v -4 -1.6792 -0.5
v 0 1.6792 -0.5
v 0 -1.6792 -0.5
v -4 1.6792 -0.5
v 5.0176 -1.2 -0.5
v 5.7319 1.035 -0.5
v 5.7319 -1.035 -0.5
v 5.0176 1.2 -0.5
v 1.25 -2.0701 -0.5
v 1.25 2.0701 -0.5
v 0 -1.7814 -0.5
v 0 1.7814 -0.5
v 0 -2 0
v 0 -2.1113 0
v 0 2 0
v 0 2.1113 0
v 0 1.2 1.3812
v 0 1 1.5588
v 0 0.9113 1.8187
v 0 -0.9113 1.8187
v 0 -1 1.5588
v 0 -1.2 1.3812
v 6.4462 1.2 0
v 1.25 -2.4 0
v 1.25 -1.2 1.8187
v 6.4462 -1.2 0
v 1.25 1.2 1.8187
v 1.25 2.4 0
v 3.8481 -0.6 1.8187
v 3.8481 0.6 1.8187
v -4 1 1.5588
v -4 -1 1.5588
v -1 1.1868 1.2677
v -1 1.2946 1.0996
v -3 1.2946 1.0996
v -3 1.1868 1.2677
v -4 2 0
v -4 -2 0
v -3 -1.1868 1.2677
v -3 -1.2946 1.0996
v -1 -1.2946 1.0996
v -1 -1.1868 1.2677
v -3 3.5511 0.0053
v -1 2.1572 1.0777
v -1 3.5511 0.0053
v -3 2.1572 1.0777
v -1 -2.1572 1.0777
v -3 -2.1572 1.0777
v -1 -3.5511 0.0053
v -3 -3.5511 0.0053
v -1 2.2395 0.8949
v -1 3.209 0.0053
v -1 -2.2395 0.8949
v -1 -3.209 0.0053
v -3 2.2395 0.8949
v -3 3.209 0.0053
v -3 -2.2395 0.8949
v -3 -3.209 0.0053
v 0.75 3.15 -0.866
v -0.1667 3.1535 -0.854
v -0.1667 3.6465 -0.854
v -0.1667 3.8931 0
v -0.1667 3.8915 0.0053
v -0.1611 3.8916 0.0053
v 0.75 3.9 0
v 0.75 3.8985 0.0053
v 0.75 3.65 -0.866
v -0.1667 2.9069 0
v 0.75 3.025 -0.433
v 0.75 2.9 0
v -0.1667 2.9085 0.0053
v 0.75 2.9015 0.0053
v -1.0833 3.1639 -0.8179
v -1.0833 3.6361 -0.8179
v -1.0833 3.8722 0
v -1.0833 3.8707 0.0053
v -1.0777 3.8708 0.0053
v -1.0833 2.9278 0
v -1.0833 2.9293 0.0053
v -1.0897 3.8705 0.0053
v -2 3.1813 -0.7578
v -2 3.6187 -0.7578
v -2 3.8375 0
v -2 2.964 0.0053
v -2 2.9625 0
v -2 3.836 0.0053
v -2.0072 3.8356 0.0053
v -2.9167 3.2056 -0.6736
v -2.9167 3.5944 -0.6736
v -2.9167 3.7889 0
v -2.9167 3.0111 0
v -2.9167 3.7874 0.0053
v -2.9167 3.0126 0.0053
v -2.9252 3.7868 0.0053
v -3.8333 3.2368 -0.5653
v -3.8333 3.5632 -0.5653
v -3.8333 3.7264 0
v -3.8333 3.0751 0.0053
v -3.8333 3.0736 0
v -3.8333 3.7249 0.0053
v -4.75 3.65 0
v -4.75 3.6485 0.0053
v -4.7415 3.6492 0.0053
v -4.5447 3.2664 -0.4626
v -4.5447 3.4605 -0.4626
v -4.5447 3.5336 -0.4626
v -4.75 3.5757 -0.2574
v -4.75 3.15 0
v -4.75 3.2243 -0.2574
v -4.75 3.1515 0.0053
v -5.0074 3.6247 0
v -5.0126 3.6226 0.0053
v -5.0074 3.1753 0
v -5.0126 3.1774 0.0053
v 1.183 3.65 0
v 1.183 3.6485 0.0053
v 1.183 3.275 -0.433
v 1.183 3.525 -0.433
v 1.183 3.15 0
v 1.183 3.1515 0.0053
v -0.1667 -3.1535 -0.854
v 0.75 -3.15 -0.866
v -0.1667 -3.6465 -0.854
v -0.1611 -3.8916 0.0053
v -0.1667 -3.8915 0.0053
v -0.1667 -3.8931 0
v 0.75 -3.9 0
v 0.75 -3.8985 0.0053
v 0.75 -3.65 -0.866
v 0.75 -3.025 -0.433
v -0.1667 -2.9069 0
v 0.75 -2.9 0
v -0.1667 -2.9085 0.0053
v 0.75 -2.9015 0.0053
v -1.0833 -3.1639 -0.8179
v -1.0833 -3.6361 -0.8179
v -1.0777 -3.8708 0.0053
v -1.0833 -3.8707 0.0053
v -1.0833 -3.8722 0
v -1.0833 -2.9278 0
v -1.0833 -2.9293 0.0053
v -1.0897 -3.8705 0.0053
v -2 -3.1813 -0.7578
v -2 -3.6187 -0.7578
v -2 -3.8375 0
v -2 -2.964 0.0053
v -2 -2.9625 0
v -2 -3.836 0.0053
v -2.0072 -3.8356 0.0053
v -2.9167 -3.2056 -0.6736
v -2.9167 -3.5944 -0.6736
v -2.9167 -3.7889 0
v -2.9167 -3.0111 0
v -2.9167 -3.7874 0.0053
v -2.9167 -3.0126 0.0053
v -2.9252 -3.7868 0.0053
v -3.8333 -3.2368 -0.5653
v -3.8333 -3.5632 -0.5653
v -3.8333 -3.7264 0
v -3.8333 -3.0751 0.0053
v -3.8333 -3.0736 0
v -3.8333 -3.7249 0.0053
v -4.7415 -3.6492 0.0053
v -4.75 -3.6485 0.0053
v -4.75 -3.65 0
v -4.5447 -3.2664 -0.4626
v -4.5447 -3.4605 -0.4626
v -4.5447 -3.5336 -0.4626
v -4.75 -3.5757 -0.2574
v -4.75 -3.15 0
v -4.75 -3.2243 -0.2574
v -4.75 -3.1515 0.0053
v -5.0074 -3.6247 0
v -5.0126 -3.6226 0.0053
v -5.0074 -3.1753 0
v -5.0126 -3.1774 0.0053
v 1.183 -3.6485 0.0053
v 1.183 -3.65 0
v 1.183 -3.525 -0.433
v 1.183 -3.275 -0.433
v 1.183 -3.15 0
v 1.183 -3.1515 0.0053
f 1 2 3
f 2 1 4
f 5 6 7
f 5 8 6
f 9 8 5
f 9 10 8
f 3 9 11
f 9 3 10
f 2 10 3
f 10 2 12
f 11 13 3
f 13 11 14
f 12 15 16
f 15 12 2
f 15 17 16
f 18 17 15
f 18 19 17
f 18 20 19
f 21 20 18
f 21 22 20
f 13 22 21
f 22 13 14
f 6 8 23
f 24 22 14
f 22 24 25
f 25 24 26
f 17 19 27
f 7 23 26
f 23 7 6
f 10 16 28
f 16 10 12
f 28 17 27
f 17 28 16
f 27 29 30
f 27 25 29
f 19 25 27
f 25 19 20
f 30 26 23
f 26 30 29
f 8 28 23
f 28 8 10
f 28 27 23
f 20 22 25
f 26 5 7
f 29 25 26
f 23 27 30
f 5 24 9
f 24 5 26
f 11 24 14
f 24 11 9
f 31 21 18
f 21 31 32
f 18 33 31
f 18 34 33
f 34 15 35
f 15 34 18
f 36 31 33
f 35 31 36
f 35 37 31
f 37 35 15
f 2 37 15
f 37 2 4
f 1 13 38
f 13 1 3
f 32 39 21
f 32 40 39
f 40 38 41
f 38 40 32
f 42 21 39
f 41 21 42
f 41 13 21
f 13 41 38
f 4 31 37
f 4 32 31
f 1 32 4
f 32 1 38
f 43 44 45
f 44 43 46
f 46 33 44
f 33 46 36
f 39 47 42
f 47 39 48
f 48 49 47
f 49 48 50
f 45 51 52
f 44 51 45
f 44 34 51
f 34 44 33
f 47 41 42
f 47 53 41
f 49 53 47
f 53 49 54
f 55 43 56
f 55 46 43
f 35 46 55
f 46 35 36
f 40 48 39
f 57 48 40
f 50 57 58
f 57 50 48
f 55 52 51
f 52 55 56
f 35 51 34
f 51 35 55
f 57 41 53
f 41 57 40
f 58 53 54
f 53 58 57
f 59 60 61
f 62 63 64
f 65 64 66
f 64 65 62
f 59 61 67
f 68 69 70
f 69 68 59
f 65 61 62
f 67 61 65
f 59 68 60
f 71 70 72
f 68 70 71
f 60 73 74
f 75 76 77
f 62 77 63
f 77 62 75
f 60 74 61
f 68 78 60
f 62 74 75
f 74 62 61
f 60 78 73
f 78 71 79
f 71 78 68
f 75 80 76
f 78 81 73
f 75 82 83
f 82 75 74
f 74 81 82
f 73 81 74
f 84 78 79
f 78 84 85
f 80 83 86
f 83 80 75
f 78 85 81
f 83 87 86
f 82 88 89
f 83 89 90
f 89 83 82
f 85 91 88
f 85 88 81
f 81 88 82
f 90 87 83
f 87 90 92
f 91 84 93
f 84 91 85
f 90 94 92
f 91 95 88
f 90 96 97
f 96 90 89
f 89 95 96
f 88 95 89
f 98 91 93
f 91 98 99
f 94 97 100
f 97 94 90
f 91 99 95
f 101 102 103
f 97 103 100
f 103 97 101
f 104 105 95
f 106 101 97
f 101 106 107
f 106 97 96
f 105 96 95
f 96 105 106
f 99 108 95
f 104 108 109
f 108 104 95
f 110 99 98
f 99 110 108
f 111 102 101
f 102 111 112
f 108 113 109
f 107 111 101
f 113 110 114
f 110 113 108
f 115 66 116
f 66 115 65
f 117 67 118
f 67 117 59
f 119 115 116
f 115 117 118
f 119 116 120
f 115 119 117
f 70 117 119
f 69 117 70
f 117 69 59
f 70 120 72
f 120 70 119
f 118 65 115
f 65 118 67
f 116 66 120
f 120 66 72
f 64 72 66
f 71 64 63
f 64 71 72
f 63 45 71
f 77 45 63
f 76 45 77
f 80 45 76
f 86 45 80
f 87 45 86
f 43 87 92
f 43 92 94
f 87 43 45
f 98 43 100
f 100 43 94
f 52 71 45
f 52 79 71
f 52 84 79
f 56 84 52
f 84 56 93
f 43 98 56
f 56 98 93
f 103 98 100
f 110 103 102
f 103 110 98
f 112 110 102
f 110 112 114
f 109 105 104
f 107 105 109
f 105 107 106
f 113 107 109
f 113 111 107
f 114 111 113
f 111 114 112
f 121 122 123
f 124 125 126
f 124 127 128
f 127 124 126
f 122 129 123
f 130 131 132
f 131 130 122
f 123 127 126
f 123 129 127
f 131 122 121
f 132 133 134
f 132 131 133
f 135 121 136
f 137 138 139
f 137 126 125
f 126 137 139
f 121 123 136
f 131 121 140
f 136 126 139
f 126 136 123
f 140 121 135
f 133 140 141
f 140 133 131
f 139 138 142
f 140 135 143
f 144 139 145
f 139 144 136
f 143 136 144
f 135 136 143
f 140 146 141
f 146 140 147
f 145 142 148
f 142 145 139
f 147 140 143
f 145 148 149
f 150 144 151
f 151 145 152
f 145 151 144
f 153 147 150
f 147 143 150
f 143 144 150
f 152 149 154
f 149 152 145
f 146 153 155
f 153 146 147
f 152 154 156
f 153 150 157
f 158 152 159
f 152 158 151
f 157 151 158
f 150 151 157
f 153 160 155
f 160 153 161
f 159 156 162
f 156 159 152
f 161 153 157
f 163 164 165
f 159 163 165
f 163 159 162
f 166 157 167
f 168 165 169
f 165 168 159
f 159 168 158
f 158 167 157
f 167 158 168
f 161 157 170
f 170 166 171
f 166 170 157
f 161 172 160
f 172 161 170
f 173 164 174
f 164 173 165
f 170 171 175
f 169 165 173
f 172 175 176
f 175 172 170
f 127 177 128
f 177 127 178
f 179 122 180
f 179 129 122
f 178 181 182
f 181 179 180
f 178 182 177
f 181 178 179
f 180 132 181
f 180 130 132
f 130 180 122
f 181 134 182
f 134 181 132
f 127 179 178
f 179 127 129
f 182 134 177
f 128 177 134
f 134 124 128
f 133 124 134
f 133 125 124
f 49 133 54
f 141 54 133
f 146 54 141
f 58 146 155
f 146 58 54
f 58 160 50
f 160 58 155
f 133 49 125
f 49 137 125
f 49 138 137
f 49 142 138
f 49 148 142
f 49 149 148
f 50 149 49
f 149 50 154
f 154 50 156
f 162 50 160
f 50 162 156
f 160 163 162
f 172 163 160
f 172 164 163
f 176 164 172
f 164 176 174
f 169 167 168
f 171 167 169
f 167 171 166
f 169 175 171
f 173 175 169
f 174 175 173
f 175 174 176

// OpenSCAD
// file: util.scad
fn1 = 32;
fn2 = 16;

module util_half_sphere(radius, fn=fn1) {
    difference() {
        sphere(radius, $fn=fn);
        translate([0,0,-(radius+radius/19)])
            cube(2*radius+radius/10, center=true);
    }
}

function gcd(a,b) = a == b ? a : a > b ? gcd(a-b, b) : gcd(a, b-a);

module util_saucer(length, width, height, fn=fn1) {
    rad = gcd(length,gcd(width,height));
    //rad = 10;
    scale([length/(2*rad), width/(2*rad), height/rad])
        util_half_sphere(rad, fn);
}

module util_half_cylinder(length, radius, inner_fn=fn2, outer_fn=fn1) {
    maxval = max(length, 2*radius);
    intersection() {
        difference() {
            rotate([0,90,0])
                translate([0,0,-(length/2 + length/20)])
                    cylinder(length+length/10, radius, radius, $fn=inner_fn);
            
            translate([0,0,(maxval/2 + maxval/19)])
                cube(maxval+maxval/10, center=true);
        }
        
        translate([0,0,-(radius+radius/20)])
            cylinder(radius + radius/10, length/2, length/2, $fn=outer_fn);
    }
}

module util_body(length, width, height, upper_height, fn=fn1) {
    rad = gcd(length, gcd(width, upper_height));
    
    scale(.995) scale([length/(2*rad), width/(2*rad), 1])
        util_half_cylinder(2*rad, height, outer_fn=fn);
}

module util_graded_cylinder(height, radius_start, radius_end, grades=1, fn=fn1) {
    height_grade = height / grades;
    radius_grade = (radius_start - radius_end) / (grades * grades);
    for (i = [0 : 1 : grades]) {
        translate([0,0,i*height_grade])
            cylinder(height_grade, 
                     radius_start - i*radius_grade * i,
                     radius_start - (i+1) * radius_grade * (i+1),
                     $fn = fn);
    }
}

module util_nacelle(length, width, height, curved=false, up=true, front_bulge=false) {
    rad = min(width, height/2);
    grads = curved ? 6 : 1;
    scale_factor = front_bulge ? 1.1 : 1;
    direction = up ? -1 : 1;
    difference() {
        scale([1, width/ (2*rad), height/rad])
            difference() {
                union() {
                    rotate([0,-90,0])
                        rotate(30)
                            util_graded_cylinder(length-rad, rad, rad/2, grads, 6);
                    scale(scale_factor) 
                        rotate([0,90,0]) rotate(90) sphere(rad, $fn=6);
                }
                
                translate([-length/2, 0, direction * (height/2 + height/19)])
                    cube([length+length, width+width, height+height/10], center=true);
            }
        
        translate([-length-(curved?length/3:0), 0, -length/3])
            rotate([0,-45,0])
                cube(length, center=true);
    }
}

module util_mirrored(v) {
    children();
    mirror(v) children();
}

module util_ring(outer, inner, height) {
    difference() {
        translate([0,0,-height/2])
            cylinder(height, outer, outer);
        translate([0,0,-(height/2 + height/19)])
            cylinder(height+height/10, inner, inner);
    }
}

module util_star(radius, thick, num, half=false) {
    angle = 360/num;
    offset = half? angle/2 : 0;
    for (i = [0: 1: num]) {
        rotate(i* angle + offset)
            translate([radius/2,0,0])
                cube([radius, thick, thick], center=true);
    }
}

module util_ring_star(radius, thick, num, inner, half=false) {
    outer=inner+thick;
    avg = (inner + outer)/2;
    union() {
        difference() {
            util_star(radius, thick, num, half);
            cylinder(2*thick, outer, outer, $fn=num, center=true);
        }
        util_ring(outer, inner, thick);
    }
}

module util_hangar_disk(height, lower, upper, num, fn=fn1) {
    difference() {
            cylinder(height, lower, upper, $fn=fn, center=true);
        difference() {
            scale([1,1,22])
                util_star(1.1*upper, height/20, num, half=true);
            scale(.95)
                cylinder(height, lower, upper, $fn=fn, center=true);
        }
    }
}

module util_hangar_form(length, width, height, num, inner=0) {
    l = 0.6* max(length, width);
    h = 2.5* height;
    thick = height/20;
    inner = inner == 0 ? l/3 : inner;
    difference() {
        children();
        scale([1,1,h/thick]) 
            util_ring_star(l, thick, num, inner, half=true);
    }
    scale(.95) children();
}

module util_nacelle_bar(span, height, width, thickness) {
    rad = (span*span/(8*height) + height/2);
    outer = rad + thickness/2;
    inner = rad - thickness/2;
    difference(){
        translate([0,0,outer])
            rotate([0,90,0])
                util_ring(outer, inner, width);
    
        translate([0,0,1.1*outer+height])
            cube(2.2*outer, center=true);
    }
}
// main file
use <util.scad>;



module macs_pod_diff() {
    translate([0,0,-(6+.5)])
        cube(12, center=true);

    translate([-(3+1.25),0,0])
        cube(6, center=true);
}

module macs_pod() {
    difference() {
        scale([1,.4,.35])
            rotate(90)
                sphere(6, $fn=6);
        macs_pod_diff();
    }
    
    //macs_pod_wing();
}



module macs_pod_wing() {
    translate([-1,0,0])
        rotate([0,90,0])
            scale([.1,1,1])
                cylinder(2, 3.5, 2.75, $fn=6);
}

module macs_small_warp() {
    difference() {
        scale([1,1,.9])
            rotate([0,-90,0])
                rotate(90)
                    cylinder(4,2,2,$fn=6, center=true);

        translate([0,0,-(6+.5)])
            cube(12, center=true);
    }

    translate([0,0,1.5])
        mirror([0,0,1])
            scale([1,1.2,0.8])
                util_nacelle_bar(6,2,2,.15);

    util_mirrored([0,1,0])
        translate([2.75,3.4,0])
            util_nacelle(6,1,1,curved=true, up=false);
}

module macs_small_shuttle() {
    union() {
        translate([1.25,0,0]) macs_pod();
        translate([-2,0,0]) macs_small_warp();
    }
}

macs_small_shuttle();
